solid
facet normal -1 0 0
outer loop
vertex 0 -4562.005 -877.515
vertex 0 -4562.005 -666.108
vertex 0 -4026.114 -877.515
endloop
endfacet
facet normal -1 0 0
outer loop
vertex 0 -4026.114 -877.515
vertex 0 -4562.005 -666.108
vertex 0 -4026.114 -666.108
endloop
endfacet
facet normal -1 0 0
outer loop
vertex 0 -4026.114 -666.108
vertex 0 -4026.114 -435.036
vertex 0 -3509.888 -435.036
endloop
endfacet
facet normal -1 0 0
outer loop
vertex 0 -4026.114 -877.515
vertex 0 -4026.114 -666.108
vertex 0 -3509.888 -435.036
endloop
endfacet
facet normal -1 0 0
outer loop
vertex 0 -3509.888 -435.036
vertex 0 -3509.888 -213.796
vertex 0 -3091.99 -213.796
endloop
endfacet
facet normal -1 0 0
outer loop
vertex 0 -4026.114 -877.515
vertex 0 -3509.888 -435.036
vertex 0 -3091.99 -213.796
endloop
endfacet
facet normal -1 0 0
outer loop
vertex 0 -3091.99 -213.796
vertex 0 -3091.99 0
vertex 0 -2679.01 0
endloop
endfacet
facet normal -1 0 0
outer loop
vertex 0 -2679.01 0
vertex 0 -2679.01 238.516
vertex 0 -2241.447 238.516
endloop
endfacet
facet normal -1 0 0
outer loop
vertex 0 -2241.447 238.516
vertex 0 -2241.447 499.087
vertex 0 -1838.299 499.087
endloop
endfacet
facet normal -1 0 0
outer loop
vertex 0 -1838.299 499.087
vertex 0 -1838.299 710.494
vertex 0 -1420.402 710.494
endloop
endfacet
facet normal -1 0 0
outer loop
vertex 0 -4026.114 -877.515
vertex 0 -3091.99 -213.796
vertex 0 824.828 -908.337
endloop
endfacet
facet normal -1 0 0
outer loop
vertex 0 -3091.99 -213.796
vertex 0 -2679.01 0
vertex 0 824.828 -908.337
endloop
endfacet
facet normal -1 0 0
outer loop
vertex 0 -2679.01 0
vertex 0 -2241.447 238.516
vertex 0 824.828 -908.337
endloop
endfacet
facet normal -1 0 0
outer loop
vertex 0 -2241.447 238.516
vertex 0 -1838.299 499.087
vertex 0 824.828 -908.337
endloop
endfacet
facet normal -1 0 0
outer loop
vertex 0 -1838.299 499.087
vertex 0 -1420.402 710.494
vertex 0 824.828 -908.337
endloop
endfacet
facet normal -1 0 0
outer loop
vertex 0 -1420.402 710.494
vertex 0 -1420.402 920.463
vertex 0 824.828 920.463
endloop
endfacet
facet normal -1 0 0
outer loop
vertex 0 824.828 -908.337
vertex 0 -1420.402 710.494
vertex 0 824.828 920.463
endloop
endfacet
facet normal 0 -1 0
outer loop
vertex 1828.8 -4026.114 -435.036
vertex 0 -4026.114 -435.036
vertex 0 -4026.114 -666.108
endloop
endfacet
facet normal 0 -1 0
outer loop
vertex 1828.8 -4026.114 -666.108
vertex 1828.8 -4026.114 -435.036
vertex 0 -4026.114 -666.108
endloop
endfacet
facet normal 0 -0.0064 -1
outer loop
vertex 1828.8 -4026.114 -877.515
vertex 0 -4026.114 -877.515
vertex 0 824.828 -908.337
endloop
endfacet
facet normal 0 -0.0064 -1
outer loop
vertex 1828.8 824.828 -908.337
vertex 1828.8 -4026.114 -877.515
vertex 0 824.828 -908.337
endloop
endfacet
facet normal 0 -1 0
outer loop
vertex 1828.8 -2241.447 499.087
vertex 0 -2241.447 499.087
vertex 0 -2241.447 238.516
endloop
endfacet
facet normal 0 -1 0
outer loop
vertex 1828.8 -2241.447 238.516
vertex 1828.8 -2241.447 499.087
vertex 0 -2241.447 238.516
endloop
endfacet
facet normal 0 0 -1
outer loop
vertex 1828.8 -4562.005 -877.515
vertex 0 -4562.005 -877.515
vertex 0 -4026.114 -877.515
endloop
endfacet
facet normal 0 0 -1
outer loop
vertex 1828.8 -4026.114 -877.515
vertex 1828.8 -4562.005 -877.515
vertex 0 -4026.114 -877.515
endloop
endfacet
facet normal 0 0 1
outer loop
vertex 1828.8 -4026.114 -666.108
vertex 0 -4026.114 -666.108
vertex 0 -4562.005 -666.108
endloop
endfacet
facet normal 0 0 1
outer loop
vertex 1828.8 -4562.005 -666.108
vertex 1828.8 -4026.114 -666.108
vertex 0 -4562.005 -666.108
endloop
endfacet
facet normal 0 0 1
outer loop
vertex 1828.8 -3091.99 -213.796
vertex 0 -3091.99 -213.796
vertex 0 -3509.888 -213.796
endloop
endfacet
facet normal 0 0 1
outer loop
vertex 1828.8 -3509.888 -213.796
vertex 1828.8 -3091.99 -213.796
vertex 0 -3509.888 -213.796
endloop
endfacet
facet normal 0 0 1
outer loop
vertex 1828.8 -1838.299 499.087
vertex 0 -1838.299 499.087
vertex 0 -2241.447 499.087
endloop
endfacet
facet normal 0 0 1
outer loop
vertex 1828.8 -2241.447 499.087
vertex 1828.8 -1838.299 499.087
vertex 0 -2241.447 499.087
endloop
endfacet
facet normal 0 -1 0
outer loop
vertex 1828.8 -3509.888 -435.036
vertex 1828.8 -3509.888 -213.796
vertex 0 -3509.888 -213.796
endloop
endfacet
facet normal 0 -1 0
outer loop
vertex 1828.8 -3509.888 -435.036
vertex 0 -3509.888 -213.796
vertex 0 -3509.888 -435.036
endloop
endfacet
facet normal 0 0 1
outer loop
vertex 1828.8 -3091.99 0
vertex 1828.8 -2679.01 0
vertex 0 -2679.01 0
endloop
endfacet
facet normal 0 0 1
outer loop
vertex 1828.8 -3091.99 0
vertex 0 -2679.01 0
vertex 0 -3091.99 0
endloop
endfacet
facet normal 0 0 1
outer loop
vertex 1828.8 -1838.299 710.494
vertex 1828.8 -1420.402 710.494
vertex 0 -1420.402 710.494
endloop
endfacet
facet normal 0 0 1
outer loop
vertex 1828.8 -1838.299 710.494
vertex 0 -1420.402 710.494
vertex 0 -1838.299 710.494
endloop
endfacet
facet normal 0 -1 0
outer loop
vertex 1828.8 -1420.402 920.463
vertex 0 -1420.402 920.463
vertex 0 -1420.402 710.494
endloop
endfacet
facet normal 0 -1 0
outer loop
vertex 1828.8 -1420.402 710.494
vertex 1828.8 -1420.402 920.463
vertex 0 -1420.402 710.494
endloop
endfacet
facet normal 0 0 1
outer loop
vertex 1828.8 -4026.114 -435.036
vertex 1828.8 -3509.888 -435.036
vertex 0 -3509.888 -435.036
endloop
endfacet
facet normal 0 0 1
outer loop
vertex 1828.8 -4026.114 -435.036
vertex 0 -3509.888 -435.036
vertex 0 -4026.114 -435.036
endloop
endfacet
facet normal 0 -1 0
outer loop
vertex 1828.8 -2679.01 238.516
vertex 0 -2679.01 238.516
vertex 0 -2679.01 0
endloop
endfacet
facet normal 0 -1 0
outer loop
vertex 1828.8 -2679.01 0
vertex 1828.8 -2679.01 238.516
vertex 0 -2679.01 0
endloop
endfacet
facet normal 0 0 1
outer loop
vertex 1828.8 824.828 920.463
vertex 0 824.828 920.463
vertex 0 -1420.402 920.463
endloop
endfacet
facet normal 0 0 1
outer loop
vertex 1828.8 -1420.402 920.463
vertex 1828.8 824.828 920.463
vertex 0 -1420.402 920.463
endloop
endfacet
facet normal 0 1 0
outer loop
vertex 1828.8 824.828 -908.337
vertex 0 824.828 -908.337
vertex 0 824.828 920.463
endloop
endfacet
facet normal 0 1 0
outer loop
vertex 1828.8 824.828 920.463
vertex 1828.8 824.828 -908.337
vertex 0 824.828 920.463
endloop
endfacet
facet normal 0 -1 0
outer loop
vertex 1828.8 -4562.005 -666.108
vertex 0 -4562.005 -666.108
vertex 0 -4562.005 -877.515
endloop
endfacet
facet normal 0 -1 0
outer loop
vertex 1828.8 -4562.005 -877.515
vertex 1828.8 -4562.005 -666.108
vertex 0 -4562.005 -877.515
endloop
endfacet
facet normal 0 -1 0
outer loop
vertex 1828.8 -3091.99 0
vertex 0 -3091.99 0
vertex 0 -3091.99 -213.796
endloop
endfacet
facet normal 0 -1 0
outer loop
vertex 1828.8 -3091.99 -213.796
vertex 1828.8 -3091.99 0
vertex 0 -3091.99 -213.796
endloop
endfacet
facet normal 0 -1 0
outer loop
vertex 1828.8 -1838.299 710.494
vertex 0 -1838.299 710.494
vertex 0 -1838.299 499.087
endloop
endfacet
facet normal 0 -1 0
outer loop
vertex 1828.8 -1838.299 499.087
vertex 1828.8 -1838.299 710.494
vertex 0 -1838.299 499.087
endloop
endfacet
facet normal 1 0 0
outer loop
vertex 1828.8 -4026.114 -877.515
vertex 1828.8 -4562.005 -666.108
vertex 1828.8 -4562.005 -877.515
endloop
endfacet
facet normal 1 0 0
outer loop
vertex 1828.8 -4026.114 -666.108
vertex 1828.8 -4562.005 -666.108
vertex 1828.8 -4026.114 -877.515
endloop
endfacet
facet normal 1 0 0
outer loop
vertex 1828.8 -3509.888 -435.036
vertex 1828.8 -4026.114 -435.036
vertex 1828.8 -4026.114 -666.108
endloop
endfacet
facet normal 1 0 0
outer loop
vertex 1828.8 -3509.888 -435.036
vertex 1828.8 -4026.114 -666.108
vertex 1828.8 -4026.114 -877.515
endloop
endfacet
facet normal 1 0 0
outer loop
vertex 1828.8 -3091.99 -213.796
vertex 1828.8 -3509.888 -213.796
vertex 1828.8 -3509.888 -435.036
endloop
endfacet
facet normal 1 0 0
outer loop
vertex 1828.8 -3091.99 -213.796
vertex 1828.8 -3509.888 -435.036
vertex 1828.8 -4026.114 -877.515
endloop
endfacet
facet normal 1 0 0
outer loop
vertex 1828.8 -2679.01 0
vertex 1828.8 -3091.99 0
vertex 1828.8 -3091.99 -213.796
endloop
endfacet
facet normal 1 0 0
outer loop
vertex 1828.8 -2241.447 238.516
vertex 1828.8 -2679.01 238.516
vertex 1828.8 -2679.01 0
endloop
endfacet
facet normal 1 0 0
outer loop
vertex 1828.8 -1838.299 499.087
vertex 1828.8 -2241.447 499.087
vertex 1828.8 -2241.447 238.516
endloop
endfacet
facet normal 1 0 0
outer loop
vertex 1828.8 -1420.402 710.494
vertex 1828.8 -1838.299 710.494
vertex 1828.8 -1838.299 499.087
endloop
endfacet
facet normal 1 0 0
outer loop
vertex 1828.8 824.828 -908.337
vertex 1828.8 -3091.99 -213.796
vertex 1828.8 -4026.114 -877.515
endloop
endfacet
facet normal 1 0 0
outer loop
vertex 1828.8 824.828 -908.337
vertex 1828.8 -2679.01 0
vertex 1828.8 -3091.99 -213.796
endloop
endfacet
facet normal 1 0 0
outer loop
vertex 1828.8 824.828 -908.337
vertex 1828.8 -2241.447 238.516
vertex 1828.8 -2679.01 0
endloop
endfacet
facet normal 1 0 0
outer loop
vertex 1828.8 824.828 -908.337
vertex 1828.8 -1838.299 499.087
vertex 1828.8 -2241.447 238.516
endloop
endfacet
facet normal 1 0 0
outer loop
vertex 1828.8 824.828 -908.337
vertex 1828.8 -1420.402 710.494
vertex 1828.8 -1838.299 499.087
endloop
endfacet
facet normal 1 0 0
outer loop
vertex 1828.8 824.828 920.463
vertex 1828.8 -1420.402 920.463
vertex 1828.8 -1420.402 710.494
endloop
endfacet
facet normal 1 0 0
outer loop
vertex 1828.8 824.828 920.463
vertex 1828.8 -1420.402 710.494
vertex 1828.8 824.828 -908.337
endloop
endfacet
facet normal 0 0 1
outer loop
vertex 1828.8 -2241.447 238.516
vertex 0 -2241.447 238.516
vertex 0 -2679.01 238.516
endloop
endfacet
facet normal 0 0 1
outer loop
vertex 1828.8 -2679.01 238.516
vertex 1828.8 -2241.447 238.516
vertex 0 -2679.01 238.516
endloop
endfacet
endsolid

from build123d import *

# Parameters (mm, degrees)
F1_DEPTH = 1828.8


with BuildPart() as f1:
    # F0 (on Right) → F1 (new body)
    with BuildSketch(Plane.YZ):
        Polygon((824.828423, -908.336986), (824.828423, 920.463014), (-1003.971577, 920.463014), (-1420.401931, 920.463014), (-1420.401931, 710.494041), (-1838.299036, 710.494041), (-1838.299036, 499.087185), (-2241.446972, 499.087185), (-2241.446972, 238.516003), (-2679.009676, 238.516003), (-2679.009676, 0), (-3091.990471, 0), (-3091.990471, -213.796198), (-3509.887695, -213.796198), (-3509.887695, -435.035884), (-4026.11351, -435.035884), (-4026.11351, -666.108429), (-4562.005043, -666.108429), (-4562.005043, -877.515197), (-4026.11351, -877.515197), align=None)
    extrude(amount=F1_DEPTH)


solid = f1.part
